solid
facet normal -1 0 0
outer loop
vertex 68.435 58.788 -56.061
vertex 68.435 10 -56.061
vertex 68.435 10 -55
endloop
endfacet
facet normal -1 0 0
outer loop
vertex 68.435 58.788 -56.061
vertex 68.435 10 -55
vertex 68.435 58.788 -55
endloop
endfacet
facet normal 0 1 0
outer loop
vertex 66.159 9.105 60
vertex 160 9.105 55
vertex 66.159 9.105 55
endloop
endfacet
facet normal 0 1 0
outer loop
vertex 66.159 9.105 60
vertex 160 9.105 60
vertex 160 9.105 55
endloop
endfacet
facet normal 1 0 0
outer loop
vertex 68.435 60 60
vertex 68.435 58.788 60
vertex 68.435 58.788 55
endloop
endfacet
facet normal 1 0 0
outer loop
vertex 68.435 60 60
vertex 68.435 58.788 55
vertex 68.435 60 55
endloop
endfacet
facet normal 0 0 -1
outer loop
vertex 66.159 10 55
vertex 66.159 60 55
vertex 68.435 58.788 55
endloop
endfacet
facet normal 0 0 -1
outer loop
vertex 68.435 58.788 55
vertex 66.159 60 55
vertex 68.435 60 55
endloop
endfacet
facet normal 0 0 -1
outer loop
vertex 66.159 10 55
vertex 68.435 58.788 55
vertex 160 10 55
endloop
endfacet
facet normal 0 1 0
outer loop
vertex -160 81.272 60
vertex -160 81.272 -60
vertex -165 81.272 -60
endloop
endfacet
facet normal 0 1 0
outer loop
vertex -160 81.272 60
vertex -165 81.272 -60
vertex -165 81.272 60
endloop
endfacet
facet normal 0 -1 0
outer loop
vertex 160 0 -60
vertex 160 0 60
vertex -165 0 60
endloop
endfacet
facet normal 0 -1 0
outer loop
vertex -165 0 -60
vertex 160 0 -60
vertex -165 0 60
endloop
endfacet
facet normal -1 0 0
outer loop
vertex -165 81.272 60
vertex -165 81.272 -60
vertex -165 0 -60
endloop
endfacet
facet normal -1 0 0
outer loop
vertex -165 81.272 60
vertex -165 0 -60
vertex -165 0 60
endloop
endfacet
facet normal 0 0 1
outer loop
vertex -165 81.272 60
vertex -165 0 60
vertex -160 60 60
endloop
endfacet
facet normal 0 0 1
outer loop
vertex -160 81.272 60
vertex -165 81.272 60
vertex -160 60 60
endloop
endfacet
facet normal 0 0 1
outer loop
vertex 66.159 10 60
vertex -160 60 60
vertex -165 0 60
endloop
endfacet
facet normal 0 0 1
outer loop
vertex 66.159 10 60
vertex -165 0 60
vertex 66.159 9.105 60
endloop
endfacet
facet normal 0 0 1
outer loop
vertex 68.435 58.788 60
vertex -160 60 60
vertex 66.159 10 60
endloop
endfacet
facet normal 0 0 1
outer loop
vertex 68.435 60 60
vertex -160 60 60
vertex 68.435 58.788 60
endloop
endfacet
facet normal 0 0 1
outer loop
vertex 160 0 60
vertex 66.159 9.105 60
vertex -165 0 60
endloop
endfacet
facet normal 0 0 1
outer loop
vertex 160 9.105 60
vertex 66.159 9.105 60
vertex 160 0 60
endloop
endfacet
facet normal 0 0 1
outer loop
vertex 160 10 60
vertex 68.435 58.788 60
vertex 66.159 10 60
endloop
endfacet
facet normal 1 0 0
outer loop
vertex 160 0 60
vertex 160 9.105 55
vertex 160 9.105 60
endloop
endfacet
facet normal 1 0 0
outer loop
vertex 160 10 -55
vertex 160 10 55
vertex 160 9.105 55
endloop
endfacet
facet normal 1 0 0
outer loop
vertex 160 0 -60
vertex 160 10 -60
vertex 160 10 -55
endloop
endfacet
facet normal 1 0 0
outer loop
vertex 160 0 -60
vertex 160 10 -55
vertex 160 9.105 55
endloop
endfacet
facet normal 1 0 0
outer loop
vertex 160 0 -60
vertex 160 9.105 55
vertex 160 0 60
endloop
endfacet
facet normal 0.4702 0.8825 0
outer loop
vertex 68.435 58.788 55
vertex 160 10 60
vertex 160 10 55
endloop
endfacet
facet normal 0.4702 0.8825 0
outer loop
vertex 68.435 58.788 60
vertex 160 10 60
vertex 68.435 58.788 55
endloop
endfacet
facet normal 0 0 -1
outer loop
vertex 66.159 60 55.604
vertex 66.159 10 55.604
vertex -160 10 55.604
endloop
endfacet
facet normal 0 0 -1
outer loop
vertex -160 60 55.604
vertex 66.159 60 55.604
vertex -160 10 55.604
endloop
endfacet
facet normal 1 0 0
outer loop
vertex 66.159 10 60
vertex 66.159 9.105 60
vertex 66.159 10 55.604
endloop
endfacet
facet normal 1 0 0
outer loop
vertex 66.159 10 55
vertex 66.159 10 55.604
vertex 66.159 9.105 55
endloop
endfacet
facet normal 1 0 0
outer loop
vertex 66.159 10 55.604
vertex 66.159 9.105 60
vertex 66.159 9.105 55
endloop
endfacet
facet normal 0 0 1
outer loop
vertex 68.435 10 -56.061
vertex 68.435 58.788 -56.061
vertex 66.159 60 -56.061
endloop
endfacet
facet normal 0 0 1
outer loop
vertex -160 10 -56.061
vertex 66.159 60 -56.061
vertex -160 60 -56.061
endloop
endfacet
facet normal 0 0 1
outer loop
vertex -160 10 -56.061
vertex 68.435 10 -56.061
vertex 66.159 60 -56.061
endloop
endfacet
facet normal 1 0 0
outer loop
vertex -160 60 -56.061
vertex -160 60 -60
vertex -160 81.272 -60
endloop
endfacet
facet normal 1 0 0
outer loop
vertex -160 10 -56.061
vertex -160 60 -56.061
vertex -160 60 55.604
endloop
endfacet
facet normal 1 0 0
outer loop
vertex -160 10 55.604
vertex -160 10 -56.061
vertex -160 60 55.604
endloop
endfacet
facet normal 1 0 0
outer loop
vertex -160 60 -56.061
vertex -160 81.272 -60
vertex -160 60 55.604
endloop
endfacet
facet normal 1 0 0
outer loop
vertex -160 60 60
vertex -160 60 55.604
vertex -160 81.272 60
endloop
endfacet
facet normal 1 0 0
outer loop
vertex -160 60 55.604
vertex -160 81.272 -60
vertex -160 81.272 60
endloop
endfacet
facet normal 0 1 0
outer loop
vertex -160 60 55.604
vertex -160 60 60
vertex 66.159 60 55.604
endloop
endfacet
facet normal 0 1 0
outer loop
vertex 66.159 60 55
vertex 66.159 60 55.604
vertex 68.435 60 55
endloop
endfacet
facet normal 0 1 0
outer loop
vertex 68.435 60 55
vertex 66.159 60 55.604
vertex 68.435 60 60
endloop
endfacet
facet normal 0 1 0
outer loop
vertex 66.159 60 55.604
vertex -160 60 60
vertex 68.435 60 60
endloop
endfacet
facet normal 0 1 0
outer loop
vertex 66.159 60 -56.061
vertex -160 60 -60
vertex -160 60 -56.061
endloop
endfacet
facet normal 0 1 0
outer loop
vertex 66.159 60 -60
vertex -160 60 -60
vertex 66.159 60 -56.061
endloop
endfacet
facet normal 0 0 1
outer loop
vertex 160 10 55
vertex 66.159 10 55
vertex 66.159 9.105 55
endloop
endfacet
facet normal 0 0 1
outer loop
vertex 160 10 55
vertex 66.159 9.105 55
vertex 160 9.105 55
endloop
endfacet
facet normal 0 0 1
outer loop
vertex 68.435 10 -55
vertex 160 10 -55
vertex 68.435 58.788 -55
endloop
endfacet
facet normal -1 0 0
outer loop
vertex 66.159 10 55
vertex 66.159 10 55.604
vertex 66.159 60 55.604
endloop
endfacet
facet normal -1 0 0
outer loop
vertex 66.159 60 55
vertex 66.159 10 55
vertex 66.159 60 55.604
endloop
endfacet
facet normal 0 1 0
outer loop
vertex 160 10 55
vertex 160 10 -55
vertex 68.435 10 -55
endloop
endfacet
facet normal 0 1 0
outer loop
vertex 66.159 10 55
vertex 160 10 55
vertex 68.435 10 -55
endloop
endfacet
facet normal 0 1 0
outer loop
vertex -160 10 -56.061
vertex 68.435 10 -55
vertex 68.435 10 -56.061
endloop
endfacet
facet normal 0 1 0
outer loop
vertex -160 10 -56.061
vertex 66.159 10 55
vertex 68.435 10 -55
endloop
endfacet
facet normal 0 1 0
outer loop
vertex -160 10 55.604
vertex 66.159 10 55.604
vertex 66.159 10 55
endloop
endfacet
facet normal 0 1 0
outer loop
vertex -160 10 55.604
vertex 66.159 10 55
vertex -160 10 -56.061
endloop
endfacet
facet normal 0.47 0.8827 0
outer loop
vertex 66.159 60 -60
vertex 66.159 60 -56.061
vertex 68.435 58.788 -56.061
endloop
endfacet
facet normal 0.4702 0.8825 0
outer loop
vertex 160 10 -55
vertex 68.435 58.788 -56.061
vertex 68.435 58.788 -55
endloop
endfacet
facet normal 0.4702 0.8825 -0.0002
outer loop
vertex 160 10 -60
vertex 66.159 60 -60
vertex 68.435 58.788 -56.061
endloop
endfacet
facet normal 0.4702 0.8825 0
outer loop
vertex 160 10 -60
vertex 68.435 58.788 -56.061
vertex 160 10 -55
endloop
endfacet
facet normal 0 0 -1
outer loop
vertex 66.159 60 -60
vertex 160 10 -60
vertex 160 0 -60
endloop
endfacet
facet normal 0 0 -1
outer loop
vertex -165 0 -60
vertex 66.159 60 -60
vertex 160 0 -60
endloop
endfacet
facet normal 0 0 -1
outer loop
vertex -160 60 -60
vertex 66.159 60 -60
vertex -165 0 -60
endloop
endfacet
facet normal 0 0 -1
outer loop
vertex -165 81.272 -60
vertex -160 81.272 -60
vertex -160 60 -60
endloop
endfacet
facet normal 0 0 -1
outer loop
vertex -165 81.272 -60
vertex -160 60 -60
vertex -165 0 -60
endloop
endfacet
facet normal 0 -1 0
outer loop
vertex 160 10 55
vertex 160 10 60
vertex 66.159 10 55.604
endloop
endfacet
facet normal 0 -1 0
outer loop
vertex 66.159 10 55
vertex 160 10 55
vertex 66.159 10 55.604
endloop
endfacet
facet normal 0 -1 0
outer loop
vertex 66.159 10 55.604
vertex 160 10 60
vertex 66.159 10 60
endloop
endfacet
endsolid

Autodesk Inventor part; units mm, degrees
ref_plane "YZ Plane" through (0, 0, 0) normal (1, 0, 0) x (0, 1, 0)
ref_plane "XZ Plane" through (0, 0, 0) normal (0, 1, 0) x (-1, 0, 0)
ref_plane "XY Plane" through (0, 0, 0) normal (0, 0, 1) x (1, 0, 0)
sketch "Sketch1" plane through (0, 0, 0) normal (0, 1, 0) x (-1, 0, 0)
  line L0 (-160, 60) -> (160, 60)
  line L1 (160, 60) -> (160, -60)
  line L2 (160, -60) -> (-160, -60)
  line L3 (-160, -60) -> (-160, 60)
  line L4 (-160, 60) -> (160, -60) construction
  line L5 (160, 60) -> (-160, -60) construction
  line L6 (-27.6343, -87.1189) -> (-42.3128, -87.1189)
  line L7 (-42.3128, -87.1189) -> (-42.3128, -133.601)
  line L8 (-42.3128, -133.601) -> (-27.6343, -133.601)
  line L9 (-27.6343, -133.601) -> (-27.6343, -87.1189)
  line L10 (-27.6343, -87.1189) -> (-42.3128, -133.601) construction
  line L11 (-42.3128, -87.1189) -> (-27.6343, -133.601) construction
  point P0 (0, 0)
  point P1 (-34.9736, -110.3599)
  dimension "d0" = 320
  dimension "d1" = 120
extrude "Extrusion1" add sketch "Sketch1" along normal blind 10 contours L0 L1 L2 L3
sketch "Sketch2" plane through (0, 10, 0) normal (0, 1, 0) x (1, 0, 0)
  line L0 (-160, -60) -> (160, -60) projected
  line L1 (-160, -60) -> (66.1592, -60)
  line L2 (66.1592, -60) -> (66.1592, -55.6043)
  line L3 (66.1592, -55.6043) -> (-160, -55.6043)
  line L4 (-160, -55.6043) -> (-160, -60)
  point P0 (0, 0)
extrude "Extrusion2" add sketch "Sketch2" along normal blind 50
sketch "Sketch3" plane through (0, 10, 0) normal (0, 1, 0) x (1, 0, 0)
  line L0 (-160, 60) -> (-160, -60) projected
  line L1 (-160, 60) -> (68.4346, 60)
  line L2 (68.4346, 60) -> (68.4346, 56.0614)
  line L3 (68.4346, 56.0614) -> (-160, 56.0614)
  line L4 (-160, 56.0614) -> (-160, 60)
  point P0 (0, 0)
extrude "Extrusion3" add sketch "Sketch3" along normal blind 50
sketch "Sketch4" plane through (-160, 0, -60) normal (-1, 0, 0) x (0, 0, 1)
  line L0 (120, -68.4573) -> (0, -68.4573)
  line L1 (0, -68.4573) -> (0, 81.272)
  line L2 (0, 81.272) -> (120, 81.272)
  line L3 (120, 81.272) -> (120, -68.4573)
  line L4 (120, -68.4573) -> (0, 81.272) construction
  line L5 (0, -68.4573) -> (120, 81.272) construction
  point P0 (60, 0)
  point P1 (60, 6.4073)
extrude "Extrusion4" add sketch "Sketch4" along normal blind 5
sketch "Sketch5" plane through (-165, 0, -60) normal (-1, 0, 0) x (0, 0, 1)
  line L0 (120, -68.4573) -> (120, 81.272) projected
  line L1 (0, 0) -> (120, 0)
  line L2 (120, 0) -> (120, -68.4573)
  line L3 (120, -68.4573) -> (0, -68.4573)
  line L4 (0, -68.4573) -> (0, 0)
  point P0 (60, 0)
extrude "Extrusion5" cut sketch "Sketch5" against normal blind 5
sketch "Sketch6" plane through (160, 0, -60) normal (0, 0, -1) x (-1, 0, 0)
  line L0 (91.5654, 10) -> (91.5654, 60) projected
  line L1 (0, 0) -> (0, 10) projected
  line L2 (91.5654, 60) -> (0, 60)
  line L3 (0, 60) -> (0, 10)
  line L4 (0, 10) -> (91.5654, 10)
  line L5 (91.5654, 10) -> (91.5654, 60)
  point P0 (160, 0)
extrude "Extrusion6" add sketch "Sketch6" against normal blind 5
sketch "Sketch7" plane through (160, 0, 60) normal (0, 0, 1) x (1, 0, 0)
  line L0 (-93.8408, 10) -> (-93.8408, 60) projected
  line L1 (0, 0) -> (0, 60) projected
  line L2 (-93.8408, 60) -> (0, 60)
  line L3 (0, 60) -> (0, 9.1052)
  line L4 (0, 9.1052) -> (-93.8408, 9.1052)
  line L5 (-93.8408, 9.1052) -> (-93.8408, 60)
  point P0 (-160, 0)
extrude "Extrusion7" cut sketch "Sketch7" against normal blind 5
sketch "Sketch8" plane through (-160, 60, 60) normal (0, 0, 1) x (1, 0, 0)
  line L0 (320, -50) -> (228.4346, -50) projected
  line L1 (226.1592, 0) -> (320, 0)
  line L2 (320, 0) -> (320, -50)
  line L3 (320, -50) -> (226.1592, -50)
  line L4 (226.1592, -50) -> (226.1592, 0)
  point P0 (160, -60)
extrude "Extrusion8" add sketch "Sketch8" against normal blind 5
sketch "Sketch9" plane through (160, 0, -60) normal (0, 0, -1) x (-1, 0, 0)
  line L0 (93.8408, 10) -> (93.8408, 60) projected
  line L1 (0, 10) -> (91.5654, 10) projected
  line L2 (93.8408, 60) -> (0, 10)
  line L3 (0, 10) -> (0, 60)
  line L4 (0, 60) -> (93.8408, 60)
  point P0 (160, 0)
extrude "Extrusion9" cut sketch "Sketch9" against normal blind 5
sketch "Sketch10" plane through (-160, 60, 55) normal (0, 0, -1) x (-1, 0, 0)
  point P0 (-160, -60)
sketch "Sketch11" plane through (-160, 60, 60) normal (0, 0, 1) x (1, 0, 0)
  line L0 (228.4346, -50) -> (228.4346, 0)
  line L1 (0, 0) -> (320, 0) projected
  line L2 (320, -50) -> (320, 0) projected
  line L3 (320, -50) -> (228.4346, -1.2124) projected
  line L4 (320, -50) -> (228.4346, -1.2124)
  line L5 (228.4346, -1.2124) -> (228.4346, -50)
  line L6 (320, -60) -> (-5, -60) projected
  point P0 (160, -60)
extrude "Extrusion10" cut sketch "Sketch11" against normal blind 5
properties part number "Storagecontainer"
